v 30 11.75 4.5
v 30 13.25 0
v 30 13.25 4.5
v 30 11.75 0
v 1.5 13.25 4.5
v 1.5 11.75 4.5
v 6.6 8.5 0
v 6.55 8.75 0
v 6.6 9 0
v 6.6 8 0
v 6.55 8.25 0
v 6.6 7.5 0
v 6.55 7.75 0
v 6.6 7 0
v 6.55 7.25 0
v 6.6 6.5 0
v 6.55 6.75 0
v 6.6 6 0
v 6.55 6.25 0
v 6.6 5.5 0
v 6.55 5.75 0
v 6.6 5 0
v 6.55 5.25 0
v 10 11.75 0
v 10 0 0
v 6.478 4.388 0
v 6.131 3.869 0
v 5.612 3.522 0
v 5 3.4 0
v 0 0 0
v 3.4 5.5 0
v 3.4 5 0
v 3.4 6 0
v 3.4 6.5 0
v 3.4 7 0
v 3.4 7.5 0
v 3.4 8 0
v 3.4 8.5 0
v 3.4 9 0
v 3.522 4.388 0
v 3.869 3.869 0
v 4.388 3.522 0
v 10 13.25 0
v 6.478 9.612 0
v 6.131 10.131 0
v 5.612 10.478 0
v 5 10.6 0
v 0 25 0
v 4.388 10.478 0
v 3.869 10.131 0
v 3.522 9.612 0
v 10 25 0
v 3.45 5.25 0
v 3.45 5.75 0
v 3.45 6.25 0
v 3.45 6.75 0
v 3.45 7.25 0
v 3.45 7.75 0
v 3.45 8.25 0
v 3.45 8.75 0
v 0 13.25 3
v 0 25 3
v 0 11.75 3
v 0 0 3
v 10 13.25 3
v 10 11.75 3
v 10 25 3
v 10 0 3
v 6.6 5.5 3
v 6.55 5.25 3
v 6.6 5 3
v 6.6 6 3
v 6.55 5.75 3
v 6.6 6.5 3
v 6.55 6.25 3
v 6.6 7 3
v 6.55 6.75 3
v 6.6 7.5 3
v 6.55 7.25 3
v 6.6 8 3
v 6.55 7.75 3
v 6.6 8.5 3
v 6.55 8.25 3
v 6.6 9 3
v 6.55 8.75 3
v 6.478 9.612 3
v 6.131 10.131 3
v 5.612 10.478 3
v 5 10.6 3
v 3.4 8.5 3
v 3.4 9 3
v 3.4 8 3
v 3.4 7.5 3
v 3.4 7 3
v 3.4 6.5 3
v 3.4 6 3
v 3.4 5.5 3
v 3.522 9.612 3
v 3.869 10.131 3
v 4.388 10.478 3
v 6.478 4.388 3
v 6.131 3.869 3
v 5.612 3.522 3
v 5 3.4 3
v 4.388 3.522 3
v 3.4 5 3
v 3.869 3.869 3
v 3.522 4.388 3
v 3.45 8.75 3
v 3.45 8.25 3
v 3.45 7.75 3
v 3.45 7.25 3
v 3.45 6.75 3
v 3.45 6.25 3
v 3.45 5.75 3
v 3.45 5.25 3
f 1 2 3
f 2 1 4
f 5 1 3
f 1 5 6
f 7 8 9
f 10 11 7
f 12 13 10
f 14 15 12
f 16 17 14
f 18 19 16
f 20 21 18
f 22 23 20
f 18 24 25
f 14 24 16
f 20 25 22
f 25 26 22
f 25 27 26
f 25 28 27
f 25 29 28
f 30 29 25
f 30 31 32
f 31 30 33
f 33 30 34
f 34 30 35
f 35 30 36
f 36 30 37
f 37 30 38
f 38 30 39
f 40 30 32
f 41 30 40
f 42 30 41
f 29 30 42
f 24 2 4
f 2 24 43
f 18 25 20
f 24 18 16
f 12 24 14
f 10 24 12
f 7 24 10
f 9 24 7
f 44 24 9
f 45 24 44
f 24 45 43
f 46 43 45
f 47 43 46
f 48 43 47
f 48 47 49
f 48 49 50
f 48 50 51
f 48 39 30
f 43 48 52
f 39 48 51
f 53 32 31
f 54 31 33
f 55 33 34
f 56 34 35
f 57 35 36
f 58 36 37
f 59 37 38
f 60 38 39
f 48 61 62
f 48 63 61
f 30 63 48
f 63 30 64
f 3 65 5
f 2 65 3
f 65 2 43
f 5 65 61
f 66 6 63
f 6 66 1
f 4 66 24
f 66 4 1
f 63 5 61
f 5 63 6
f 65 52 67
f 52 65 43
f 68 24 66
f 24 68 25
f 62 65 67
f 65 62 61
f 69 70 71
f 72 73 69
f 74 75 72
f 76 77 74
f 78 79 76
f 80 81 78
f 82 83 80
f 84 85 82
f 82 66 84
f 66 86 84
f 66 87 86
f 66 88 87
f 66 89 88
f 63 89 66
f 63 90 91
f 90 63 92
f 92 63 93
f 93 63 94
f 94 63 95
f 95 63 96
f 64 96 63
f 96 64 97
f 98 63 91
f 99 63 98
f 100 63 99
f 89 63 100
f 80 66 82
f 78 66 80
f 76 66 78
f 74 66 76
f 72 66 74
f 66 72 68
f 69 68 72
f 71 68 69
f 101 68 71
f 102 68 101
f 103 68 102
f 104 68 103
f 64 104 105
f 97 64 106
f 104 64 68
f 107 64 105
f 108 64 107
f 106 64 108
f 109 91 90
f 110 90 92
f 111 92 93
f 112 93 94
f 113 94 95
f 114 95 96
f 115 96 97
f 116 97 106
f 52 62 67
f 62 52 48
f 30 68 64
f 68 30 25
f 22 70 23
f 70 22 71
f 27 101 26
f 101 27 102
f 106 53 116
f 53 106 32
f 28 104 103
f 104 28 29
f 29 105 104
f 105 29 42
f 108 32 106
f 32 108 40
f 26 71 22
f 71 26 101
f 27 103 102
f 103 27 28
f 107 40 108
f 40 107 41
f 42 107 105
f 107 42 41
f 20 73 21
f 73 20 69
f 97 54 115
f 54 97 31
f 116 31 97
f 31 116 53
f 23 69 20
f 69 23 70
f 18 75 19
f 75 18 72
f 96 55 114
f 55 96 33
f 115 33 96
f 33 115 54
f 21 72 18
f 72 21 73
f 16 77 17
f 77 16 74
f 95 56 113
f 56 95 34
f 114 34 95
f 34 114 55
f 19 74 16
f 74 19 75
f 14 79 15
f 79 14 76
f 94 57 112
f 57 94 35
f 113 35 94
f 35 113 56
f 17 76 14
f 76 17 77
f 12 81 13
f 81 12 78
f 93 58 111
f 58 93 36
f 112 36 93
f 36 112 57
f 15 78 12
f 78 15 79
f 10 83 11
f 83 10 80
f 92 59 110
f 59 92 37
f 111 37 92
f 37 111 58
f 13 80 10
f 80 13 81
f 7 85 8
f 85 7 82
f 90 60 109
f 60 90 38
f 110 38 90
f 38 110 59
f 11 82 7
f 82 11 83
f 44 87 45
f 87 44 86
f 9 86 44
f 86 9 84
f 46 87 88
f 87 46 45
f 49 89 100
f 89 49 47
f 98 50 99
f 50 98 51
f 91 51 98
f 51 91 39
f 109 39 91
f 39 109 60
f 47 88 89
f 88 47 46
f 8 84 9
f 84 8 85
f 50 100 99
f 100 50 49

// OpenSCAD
// byteborg's Prusa Y-axis endstop flag

SCREWD=3.2; // for M3 screws

$fn=16;
difference() {
	union() {
		cube([10,25,3]);
		translate([0,25/2-1.5/2,0]) difference() {
			cube([30,1.5,4.5]);
			translate([0,-4,3]) rotate([0,-45,0]) cube([10,10,10]);
		}
	}
	translate([0,0,-10]) union() {
		for(i = [5:.5:9])
			translate([5,i,0]) cylinder(r=SCREWD/2, h=20);
		for(i = [20:.5:16])
			translate([5,i,0]) cylinder(r=SCREWD/2, h=20);
	}
}
